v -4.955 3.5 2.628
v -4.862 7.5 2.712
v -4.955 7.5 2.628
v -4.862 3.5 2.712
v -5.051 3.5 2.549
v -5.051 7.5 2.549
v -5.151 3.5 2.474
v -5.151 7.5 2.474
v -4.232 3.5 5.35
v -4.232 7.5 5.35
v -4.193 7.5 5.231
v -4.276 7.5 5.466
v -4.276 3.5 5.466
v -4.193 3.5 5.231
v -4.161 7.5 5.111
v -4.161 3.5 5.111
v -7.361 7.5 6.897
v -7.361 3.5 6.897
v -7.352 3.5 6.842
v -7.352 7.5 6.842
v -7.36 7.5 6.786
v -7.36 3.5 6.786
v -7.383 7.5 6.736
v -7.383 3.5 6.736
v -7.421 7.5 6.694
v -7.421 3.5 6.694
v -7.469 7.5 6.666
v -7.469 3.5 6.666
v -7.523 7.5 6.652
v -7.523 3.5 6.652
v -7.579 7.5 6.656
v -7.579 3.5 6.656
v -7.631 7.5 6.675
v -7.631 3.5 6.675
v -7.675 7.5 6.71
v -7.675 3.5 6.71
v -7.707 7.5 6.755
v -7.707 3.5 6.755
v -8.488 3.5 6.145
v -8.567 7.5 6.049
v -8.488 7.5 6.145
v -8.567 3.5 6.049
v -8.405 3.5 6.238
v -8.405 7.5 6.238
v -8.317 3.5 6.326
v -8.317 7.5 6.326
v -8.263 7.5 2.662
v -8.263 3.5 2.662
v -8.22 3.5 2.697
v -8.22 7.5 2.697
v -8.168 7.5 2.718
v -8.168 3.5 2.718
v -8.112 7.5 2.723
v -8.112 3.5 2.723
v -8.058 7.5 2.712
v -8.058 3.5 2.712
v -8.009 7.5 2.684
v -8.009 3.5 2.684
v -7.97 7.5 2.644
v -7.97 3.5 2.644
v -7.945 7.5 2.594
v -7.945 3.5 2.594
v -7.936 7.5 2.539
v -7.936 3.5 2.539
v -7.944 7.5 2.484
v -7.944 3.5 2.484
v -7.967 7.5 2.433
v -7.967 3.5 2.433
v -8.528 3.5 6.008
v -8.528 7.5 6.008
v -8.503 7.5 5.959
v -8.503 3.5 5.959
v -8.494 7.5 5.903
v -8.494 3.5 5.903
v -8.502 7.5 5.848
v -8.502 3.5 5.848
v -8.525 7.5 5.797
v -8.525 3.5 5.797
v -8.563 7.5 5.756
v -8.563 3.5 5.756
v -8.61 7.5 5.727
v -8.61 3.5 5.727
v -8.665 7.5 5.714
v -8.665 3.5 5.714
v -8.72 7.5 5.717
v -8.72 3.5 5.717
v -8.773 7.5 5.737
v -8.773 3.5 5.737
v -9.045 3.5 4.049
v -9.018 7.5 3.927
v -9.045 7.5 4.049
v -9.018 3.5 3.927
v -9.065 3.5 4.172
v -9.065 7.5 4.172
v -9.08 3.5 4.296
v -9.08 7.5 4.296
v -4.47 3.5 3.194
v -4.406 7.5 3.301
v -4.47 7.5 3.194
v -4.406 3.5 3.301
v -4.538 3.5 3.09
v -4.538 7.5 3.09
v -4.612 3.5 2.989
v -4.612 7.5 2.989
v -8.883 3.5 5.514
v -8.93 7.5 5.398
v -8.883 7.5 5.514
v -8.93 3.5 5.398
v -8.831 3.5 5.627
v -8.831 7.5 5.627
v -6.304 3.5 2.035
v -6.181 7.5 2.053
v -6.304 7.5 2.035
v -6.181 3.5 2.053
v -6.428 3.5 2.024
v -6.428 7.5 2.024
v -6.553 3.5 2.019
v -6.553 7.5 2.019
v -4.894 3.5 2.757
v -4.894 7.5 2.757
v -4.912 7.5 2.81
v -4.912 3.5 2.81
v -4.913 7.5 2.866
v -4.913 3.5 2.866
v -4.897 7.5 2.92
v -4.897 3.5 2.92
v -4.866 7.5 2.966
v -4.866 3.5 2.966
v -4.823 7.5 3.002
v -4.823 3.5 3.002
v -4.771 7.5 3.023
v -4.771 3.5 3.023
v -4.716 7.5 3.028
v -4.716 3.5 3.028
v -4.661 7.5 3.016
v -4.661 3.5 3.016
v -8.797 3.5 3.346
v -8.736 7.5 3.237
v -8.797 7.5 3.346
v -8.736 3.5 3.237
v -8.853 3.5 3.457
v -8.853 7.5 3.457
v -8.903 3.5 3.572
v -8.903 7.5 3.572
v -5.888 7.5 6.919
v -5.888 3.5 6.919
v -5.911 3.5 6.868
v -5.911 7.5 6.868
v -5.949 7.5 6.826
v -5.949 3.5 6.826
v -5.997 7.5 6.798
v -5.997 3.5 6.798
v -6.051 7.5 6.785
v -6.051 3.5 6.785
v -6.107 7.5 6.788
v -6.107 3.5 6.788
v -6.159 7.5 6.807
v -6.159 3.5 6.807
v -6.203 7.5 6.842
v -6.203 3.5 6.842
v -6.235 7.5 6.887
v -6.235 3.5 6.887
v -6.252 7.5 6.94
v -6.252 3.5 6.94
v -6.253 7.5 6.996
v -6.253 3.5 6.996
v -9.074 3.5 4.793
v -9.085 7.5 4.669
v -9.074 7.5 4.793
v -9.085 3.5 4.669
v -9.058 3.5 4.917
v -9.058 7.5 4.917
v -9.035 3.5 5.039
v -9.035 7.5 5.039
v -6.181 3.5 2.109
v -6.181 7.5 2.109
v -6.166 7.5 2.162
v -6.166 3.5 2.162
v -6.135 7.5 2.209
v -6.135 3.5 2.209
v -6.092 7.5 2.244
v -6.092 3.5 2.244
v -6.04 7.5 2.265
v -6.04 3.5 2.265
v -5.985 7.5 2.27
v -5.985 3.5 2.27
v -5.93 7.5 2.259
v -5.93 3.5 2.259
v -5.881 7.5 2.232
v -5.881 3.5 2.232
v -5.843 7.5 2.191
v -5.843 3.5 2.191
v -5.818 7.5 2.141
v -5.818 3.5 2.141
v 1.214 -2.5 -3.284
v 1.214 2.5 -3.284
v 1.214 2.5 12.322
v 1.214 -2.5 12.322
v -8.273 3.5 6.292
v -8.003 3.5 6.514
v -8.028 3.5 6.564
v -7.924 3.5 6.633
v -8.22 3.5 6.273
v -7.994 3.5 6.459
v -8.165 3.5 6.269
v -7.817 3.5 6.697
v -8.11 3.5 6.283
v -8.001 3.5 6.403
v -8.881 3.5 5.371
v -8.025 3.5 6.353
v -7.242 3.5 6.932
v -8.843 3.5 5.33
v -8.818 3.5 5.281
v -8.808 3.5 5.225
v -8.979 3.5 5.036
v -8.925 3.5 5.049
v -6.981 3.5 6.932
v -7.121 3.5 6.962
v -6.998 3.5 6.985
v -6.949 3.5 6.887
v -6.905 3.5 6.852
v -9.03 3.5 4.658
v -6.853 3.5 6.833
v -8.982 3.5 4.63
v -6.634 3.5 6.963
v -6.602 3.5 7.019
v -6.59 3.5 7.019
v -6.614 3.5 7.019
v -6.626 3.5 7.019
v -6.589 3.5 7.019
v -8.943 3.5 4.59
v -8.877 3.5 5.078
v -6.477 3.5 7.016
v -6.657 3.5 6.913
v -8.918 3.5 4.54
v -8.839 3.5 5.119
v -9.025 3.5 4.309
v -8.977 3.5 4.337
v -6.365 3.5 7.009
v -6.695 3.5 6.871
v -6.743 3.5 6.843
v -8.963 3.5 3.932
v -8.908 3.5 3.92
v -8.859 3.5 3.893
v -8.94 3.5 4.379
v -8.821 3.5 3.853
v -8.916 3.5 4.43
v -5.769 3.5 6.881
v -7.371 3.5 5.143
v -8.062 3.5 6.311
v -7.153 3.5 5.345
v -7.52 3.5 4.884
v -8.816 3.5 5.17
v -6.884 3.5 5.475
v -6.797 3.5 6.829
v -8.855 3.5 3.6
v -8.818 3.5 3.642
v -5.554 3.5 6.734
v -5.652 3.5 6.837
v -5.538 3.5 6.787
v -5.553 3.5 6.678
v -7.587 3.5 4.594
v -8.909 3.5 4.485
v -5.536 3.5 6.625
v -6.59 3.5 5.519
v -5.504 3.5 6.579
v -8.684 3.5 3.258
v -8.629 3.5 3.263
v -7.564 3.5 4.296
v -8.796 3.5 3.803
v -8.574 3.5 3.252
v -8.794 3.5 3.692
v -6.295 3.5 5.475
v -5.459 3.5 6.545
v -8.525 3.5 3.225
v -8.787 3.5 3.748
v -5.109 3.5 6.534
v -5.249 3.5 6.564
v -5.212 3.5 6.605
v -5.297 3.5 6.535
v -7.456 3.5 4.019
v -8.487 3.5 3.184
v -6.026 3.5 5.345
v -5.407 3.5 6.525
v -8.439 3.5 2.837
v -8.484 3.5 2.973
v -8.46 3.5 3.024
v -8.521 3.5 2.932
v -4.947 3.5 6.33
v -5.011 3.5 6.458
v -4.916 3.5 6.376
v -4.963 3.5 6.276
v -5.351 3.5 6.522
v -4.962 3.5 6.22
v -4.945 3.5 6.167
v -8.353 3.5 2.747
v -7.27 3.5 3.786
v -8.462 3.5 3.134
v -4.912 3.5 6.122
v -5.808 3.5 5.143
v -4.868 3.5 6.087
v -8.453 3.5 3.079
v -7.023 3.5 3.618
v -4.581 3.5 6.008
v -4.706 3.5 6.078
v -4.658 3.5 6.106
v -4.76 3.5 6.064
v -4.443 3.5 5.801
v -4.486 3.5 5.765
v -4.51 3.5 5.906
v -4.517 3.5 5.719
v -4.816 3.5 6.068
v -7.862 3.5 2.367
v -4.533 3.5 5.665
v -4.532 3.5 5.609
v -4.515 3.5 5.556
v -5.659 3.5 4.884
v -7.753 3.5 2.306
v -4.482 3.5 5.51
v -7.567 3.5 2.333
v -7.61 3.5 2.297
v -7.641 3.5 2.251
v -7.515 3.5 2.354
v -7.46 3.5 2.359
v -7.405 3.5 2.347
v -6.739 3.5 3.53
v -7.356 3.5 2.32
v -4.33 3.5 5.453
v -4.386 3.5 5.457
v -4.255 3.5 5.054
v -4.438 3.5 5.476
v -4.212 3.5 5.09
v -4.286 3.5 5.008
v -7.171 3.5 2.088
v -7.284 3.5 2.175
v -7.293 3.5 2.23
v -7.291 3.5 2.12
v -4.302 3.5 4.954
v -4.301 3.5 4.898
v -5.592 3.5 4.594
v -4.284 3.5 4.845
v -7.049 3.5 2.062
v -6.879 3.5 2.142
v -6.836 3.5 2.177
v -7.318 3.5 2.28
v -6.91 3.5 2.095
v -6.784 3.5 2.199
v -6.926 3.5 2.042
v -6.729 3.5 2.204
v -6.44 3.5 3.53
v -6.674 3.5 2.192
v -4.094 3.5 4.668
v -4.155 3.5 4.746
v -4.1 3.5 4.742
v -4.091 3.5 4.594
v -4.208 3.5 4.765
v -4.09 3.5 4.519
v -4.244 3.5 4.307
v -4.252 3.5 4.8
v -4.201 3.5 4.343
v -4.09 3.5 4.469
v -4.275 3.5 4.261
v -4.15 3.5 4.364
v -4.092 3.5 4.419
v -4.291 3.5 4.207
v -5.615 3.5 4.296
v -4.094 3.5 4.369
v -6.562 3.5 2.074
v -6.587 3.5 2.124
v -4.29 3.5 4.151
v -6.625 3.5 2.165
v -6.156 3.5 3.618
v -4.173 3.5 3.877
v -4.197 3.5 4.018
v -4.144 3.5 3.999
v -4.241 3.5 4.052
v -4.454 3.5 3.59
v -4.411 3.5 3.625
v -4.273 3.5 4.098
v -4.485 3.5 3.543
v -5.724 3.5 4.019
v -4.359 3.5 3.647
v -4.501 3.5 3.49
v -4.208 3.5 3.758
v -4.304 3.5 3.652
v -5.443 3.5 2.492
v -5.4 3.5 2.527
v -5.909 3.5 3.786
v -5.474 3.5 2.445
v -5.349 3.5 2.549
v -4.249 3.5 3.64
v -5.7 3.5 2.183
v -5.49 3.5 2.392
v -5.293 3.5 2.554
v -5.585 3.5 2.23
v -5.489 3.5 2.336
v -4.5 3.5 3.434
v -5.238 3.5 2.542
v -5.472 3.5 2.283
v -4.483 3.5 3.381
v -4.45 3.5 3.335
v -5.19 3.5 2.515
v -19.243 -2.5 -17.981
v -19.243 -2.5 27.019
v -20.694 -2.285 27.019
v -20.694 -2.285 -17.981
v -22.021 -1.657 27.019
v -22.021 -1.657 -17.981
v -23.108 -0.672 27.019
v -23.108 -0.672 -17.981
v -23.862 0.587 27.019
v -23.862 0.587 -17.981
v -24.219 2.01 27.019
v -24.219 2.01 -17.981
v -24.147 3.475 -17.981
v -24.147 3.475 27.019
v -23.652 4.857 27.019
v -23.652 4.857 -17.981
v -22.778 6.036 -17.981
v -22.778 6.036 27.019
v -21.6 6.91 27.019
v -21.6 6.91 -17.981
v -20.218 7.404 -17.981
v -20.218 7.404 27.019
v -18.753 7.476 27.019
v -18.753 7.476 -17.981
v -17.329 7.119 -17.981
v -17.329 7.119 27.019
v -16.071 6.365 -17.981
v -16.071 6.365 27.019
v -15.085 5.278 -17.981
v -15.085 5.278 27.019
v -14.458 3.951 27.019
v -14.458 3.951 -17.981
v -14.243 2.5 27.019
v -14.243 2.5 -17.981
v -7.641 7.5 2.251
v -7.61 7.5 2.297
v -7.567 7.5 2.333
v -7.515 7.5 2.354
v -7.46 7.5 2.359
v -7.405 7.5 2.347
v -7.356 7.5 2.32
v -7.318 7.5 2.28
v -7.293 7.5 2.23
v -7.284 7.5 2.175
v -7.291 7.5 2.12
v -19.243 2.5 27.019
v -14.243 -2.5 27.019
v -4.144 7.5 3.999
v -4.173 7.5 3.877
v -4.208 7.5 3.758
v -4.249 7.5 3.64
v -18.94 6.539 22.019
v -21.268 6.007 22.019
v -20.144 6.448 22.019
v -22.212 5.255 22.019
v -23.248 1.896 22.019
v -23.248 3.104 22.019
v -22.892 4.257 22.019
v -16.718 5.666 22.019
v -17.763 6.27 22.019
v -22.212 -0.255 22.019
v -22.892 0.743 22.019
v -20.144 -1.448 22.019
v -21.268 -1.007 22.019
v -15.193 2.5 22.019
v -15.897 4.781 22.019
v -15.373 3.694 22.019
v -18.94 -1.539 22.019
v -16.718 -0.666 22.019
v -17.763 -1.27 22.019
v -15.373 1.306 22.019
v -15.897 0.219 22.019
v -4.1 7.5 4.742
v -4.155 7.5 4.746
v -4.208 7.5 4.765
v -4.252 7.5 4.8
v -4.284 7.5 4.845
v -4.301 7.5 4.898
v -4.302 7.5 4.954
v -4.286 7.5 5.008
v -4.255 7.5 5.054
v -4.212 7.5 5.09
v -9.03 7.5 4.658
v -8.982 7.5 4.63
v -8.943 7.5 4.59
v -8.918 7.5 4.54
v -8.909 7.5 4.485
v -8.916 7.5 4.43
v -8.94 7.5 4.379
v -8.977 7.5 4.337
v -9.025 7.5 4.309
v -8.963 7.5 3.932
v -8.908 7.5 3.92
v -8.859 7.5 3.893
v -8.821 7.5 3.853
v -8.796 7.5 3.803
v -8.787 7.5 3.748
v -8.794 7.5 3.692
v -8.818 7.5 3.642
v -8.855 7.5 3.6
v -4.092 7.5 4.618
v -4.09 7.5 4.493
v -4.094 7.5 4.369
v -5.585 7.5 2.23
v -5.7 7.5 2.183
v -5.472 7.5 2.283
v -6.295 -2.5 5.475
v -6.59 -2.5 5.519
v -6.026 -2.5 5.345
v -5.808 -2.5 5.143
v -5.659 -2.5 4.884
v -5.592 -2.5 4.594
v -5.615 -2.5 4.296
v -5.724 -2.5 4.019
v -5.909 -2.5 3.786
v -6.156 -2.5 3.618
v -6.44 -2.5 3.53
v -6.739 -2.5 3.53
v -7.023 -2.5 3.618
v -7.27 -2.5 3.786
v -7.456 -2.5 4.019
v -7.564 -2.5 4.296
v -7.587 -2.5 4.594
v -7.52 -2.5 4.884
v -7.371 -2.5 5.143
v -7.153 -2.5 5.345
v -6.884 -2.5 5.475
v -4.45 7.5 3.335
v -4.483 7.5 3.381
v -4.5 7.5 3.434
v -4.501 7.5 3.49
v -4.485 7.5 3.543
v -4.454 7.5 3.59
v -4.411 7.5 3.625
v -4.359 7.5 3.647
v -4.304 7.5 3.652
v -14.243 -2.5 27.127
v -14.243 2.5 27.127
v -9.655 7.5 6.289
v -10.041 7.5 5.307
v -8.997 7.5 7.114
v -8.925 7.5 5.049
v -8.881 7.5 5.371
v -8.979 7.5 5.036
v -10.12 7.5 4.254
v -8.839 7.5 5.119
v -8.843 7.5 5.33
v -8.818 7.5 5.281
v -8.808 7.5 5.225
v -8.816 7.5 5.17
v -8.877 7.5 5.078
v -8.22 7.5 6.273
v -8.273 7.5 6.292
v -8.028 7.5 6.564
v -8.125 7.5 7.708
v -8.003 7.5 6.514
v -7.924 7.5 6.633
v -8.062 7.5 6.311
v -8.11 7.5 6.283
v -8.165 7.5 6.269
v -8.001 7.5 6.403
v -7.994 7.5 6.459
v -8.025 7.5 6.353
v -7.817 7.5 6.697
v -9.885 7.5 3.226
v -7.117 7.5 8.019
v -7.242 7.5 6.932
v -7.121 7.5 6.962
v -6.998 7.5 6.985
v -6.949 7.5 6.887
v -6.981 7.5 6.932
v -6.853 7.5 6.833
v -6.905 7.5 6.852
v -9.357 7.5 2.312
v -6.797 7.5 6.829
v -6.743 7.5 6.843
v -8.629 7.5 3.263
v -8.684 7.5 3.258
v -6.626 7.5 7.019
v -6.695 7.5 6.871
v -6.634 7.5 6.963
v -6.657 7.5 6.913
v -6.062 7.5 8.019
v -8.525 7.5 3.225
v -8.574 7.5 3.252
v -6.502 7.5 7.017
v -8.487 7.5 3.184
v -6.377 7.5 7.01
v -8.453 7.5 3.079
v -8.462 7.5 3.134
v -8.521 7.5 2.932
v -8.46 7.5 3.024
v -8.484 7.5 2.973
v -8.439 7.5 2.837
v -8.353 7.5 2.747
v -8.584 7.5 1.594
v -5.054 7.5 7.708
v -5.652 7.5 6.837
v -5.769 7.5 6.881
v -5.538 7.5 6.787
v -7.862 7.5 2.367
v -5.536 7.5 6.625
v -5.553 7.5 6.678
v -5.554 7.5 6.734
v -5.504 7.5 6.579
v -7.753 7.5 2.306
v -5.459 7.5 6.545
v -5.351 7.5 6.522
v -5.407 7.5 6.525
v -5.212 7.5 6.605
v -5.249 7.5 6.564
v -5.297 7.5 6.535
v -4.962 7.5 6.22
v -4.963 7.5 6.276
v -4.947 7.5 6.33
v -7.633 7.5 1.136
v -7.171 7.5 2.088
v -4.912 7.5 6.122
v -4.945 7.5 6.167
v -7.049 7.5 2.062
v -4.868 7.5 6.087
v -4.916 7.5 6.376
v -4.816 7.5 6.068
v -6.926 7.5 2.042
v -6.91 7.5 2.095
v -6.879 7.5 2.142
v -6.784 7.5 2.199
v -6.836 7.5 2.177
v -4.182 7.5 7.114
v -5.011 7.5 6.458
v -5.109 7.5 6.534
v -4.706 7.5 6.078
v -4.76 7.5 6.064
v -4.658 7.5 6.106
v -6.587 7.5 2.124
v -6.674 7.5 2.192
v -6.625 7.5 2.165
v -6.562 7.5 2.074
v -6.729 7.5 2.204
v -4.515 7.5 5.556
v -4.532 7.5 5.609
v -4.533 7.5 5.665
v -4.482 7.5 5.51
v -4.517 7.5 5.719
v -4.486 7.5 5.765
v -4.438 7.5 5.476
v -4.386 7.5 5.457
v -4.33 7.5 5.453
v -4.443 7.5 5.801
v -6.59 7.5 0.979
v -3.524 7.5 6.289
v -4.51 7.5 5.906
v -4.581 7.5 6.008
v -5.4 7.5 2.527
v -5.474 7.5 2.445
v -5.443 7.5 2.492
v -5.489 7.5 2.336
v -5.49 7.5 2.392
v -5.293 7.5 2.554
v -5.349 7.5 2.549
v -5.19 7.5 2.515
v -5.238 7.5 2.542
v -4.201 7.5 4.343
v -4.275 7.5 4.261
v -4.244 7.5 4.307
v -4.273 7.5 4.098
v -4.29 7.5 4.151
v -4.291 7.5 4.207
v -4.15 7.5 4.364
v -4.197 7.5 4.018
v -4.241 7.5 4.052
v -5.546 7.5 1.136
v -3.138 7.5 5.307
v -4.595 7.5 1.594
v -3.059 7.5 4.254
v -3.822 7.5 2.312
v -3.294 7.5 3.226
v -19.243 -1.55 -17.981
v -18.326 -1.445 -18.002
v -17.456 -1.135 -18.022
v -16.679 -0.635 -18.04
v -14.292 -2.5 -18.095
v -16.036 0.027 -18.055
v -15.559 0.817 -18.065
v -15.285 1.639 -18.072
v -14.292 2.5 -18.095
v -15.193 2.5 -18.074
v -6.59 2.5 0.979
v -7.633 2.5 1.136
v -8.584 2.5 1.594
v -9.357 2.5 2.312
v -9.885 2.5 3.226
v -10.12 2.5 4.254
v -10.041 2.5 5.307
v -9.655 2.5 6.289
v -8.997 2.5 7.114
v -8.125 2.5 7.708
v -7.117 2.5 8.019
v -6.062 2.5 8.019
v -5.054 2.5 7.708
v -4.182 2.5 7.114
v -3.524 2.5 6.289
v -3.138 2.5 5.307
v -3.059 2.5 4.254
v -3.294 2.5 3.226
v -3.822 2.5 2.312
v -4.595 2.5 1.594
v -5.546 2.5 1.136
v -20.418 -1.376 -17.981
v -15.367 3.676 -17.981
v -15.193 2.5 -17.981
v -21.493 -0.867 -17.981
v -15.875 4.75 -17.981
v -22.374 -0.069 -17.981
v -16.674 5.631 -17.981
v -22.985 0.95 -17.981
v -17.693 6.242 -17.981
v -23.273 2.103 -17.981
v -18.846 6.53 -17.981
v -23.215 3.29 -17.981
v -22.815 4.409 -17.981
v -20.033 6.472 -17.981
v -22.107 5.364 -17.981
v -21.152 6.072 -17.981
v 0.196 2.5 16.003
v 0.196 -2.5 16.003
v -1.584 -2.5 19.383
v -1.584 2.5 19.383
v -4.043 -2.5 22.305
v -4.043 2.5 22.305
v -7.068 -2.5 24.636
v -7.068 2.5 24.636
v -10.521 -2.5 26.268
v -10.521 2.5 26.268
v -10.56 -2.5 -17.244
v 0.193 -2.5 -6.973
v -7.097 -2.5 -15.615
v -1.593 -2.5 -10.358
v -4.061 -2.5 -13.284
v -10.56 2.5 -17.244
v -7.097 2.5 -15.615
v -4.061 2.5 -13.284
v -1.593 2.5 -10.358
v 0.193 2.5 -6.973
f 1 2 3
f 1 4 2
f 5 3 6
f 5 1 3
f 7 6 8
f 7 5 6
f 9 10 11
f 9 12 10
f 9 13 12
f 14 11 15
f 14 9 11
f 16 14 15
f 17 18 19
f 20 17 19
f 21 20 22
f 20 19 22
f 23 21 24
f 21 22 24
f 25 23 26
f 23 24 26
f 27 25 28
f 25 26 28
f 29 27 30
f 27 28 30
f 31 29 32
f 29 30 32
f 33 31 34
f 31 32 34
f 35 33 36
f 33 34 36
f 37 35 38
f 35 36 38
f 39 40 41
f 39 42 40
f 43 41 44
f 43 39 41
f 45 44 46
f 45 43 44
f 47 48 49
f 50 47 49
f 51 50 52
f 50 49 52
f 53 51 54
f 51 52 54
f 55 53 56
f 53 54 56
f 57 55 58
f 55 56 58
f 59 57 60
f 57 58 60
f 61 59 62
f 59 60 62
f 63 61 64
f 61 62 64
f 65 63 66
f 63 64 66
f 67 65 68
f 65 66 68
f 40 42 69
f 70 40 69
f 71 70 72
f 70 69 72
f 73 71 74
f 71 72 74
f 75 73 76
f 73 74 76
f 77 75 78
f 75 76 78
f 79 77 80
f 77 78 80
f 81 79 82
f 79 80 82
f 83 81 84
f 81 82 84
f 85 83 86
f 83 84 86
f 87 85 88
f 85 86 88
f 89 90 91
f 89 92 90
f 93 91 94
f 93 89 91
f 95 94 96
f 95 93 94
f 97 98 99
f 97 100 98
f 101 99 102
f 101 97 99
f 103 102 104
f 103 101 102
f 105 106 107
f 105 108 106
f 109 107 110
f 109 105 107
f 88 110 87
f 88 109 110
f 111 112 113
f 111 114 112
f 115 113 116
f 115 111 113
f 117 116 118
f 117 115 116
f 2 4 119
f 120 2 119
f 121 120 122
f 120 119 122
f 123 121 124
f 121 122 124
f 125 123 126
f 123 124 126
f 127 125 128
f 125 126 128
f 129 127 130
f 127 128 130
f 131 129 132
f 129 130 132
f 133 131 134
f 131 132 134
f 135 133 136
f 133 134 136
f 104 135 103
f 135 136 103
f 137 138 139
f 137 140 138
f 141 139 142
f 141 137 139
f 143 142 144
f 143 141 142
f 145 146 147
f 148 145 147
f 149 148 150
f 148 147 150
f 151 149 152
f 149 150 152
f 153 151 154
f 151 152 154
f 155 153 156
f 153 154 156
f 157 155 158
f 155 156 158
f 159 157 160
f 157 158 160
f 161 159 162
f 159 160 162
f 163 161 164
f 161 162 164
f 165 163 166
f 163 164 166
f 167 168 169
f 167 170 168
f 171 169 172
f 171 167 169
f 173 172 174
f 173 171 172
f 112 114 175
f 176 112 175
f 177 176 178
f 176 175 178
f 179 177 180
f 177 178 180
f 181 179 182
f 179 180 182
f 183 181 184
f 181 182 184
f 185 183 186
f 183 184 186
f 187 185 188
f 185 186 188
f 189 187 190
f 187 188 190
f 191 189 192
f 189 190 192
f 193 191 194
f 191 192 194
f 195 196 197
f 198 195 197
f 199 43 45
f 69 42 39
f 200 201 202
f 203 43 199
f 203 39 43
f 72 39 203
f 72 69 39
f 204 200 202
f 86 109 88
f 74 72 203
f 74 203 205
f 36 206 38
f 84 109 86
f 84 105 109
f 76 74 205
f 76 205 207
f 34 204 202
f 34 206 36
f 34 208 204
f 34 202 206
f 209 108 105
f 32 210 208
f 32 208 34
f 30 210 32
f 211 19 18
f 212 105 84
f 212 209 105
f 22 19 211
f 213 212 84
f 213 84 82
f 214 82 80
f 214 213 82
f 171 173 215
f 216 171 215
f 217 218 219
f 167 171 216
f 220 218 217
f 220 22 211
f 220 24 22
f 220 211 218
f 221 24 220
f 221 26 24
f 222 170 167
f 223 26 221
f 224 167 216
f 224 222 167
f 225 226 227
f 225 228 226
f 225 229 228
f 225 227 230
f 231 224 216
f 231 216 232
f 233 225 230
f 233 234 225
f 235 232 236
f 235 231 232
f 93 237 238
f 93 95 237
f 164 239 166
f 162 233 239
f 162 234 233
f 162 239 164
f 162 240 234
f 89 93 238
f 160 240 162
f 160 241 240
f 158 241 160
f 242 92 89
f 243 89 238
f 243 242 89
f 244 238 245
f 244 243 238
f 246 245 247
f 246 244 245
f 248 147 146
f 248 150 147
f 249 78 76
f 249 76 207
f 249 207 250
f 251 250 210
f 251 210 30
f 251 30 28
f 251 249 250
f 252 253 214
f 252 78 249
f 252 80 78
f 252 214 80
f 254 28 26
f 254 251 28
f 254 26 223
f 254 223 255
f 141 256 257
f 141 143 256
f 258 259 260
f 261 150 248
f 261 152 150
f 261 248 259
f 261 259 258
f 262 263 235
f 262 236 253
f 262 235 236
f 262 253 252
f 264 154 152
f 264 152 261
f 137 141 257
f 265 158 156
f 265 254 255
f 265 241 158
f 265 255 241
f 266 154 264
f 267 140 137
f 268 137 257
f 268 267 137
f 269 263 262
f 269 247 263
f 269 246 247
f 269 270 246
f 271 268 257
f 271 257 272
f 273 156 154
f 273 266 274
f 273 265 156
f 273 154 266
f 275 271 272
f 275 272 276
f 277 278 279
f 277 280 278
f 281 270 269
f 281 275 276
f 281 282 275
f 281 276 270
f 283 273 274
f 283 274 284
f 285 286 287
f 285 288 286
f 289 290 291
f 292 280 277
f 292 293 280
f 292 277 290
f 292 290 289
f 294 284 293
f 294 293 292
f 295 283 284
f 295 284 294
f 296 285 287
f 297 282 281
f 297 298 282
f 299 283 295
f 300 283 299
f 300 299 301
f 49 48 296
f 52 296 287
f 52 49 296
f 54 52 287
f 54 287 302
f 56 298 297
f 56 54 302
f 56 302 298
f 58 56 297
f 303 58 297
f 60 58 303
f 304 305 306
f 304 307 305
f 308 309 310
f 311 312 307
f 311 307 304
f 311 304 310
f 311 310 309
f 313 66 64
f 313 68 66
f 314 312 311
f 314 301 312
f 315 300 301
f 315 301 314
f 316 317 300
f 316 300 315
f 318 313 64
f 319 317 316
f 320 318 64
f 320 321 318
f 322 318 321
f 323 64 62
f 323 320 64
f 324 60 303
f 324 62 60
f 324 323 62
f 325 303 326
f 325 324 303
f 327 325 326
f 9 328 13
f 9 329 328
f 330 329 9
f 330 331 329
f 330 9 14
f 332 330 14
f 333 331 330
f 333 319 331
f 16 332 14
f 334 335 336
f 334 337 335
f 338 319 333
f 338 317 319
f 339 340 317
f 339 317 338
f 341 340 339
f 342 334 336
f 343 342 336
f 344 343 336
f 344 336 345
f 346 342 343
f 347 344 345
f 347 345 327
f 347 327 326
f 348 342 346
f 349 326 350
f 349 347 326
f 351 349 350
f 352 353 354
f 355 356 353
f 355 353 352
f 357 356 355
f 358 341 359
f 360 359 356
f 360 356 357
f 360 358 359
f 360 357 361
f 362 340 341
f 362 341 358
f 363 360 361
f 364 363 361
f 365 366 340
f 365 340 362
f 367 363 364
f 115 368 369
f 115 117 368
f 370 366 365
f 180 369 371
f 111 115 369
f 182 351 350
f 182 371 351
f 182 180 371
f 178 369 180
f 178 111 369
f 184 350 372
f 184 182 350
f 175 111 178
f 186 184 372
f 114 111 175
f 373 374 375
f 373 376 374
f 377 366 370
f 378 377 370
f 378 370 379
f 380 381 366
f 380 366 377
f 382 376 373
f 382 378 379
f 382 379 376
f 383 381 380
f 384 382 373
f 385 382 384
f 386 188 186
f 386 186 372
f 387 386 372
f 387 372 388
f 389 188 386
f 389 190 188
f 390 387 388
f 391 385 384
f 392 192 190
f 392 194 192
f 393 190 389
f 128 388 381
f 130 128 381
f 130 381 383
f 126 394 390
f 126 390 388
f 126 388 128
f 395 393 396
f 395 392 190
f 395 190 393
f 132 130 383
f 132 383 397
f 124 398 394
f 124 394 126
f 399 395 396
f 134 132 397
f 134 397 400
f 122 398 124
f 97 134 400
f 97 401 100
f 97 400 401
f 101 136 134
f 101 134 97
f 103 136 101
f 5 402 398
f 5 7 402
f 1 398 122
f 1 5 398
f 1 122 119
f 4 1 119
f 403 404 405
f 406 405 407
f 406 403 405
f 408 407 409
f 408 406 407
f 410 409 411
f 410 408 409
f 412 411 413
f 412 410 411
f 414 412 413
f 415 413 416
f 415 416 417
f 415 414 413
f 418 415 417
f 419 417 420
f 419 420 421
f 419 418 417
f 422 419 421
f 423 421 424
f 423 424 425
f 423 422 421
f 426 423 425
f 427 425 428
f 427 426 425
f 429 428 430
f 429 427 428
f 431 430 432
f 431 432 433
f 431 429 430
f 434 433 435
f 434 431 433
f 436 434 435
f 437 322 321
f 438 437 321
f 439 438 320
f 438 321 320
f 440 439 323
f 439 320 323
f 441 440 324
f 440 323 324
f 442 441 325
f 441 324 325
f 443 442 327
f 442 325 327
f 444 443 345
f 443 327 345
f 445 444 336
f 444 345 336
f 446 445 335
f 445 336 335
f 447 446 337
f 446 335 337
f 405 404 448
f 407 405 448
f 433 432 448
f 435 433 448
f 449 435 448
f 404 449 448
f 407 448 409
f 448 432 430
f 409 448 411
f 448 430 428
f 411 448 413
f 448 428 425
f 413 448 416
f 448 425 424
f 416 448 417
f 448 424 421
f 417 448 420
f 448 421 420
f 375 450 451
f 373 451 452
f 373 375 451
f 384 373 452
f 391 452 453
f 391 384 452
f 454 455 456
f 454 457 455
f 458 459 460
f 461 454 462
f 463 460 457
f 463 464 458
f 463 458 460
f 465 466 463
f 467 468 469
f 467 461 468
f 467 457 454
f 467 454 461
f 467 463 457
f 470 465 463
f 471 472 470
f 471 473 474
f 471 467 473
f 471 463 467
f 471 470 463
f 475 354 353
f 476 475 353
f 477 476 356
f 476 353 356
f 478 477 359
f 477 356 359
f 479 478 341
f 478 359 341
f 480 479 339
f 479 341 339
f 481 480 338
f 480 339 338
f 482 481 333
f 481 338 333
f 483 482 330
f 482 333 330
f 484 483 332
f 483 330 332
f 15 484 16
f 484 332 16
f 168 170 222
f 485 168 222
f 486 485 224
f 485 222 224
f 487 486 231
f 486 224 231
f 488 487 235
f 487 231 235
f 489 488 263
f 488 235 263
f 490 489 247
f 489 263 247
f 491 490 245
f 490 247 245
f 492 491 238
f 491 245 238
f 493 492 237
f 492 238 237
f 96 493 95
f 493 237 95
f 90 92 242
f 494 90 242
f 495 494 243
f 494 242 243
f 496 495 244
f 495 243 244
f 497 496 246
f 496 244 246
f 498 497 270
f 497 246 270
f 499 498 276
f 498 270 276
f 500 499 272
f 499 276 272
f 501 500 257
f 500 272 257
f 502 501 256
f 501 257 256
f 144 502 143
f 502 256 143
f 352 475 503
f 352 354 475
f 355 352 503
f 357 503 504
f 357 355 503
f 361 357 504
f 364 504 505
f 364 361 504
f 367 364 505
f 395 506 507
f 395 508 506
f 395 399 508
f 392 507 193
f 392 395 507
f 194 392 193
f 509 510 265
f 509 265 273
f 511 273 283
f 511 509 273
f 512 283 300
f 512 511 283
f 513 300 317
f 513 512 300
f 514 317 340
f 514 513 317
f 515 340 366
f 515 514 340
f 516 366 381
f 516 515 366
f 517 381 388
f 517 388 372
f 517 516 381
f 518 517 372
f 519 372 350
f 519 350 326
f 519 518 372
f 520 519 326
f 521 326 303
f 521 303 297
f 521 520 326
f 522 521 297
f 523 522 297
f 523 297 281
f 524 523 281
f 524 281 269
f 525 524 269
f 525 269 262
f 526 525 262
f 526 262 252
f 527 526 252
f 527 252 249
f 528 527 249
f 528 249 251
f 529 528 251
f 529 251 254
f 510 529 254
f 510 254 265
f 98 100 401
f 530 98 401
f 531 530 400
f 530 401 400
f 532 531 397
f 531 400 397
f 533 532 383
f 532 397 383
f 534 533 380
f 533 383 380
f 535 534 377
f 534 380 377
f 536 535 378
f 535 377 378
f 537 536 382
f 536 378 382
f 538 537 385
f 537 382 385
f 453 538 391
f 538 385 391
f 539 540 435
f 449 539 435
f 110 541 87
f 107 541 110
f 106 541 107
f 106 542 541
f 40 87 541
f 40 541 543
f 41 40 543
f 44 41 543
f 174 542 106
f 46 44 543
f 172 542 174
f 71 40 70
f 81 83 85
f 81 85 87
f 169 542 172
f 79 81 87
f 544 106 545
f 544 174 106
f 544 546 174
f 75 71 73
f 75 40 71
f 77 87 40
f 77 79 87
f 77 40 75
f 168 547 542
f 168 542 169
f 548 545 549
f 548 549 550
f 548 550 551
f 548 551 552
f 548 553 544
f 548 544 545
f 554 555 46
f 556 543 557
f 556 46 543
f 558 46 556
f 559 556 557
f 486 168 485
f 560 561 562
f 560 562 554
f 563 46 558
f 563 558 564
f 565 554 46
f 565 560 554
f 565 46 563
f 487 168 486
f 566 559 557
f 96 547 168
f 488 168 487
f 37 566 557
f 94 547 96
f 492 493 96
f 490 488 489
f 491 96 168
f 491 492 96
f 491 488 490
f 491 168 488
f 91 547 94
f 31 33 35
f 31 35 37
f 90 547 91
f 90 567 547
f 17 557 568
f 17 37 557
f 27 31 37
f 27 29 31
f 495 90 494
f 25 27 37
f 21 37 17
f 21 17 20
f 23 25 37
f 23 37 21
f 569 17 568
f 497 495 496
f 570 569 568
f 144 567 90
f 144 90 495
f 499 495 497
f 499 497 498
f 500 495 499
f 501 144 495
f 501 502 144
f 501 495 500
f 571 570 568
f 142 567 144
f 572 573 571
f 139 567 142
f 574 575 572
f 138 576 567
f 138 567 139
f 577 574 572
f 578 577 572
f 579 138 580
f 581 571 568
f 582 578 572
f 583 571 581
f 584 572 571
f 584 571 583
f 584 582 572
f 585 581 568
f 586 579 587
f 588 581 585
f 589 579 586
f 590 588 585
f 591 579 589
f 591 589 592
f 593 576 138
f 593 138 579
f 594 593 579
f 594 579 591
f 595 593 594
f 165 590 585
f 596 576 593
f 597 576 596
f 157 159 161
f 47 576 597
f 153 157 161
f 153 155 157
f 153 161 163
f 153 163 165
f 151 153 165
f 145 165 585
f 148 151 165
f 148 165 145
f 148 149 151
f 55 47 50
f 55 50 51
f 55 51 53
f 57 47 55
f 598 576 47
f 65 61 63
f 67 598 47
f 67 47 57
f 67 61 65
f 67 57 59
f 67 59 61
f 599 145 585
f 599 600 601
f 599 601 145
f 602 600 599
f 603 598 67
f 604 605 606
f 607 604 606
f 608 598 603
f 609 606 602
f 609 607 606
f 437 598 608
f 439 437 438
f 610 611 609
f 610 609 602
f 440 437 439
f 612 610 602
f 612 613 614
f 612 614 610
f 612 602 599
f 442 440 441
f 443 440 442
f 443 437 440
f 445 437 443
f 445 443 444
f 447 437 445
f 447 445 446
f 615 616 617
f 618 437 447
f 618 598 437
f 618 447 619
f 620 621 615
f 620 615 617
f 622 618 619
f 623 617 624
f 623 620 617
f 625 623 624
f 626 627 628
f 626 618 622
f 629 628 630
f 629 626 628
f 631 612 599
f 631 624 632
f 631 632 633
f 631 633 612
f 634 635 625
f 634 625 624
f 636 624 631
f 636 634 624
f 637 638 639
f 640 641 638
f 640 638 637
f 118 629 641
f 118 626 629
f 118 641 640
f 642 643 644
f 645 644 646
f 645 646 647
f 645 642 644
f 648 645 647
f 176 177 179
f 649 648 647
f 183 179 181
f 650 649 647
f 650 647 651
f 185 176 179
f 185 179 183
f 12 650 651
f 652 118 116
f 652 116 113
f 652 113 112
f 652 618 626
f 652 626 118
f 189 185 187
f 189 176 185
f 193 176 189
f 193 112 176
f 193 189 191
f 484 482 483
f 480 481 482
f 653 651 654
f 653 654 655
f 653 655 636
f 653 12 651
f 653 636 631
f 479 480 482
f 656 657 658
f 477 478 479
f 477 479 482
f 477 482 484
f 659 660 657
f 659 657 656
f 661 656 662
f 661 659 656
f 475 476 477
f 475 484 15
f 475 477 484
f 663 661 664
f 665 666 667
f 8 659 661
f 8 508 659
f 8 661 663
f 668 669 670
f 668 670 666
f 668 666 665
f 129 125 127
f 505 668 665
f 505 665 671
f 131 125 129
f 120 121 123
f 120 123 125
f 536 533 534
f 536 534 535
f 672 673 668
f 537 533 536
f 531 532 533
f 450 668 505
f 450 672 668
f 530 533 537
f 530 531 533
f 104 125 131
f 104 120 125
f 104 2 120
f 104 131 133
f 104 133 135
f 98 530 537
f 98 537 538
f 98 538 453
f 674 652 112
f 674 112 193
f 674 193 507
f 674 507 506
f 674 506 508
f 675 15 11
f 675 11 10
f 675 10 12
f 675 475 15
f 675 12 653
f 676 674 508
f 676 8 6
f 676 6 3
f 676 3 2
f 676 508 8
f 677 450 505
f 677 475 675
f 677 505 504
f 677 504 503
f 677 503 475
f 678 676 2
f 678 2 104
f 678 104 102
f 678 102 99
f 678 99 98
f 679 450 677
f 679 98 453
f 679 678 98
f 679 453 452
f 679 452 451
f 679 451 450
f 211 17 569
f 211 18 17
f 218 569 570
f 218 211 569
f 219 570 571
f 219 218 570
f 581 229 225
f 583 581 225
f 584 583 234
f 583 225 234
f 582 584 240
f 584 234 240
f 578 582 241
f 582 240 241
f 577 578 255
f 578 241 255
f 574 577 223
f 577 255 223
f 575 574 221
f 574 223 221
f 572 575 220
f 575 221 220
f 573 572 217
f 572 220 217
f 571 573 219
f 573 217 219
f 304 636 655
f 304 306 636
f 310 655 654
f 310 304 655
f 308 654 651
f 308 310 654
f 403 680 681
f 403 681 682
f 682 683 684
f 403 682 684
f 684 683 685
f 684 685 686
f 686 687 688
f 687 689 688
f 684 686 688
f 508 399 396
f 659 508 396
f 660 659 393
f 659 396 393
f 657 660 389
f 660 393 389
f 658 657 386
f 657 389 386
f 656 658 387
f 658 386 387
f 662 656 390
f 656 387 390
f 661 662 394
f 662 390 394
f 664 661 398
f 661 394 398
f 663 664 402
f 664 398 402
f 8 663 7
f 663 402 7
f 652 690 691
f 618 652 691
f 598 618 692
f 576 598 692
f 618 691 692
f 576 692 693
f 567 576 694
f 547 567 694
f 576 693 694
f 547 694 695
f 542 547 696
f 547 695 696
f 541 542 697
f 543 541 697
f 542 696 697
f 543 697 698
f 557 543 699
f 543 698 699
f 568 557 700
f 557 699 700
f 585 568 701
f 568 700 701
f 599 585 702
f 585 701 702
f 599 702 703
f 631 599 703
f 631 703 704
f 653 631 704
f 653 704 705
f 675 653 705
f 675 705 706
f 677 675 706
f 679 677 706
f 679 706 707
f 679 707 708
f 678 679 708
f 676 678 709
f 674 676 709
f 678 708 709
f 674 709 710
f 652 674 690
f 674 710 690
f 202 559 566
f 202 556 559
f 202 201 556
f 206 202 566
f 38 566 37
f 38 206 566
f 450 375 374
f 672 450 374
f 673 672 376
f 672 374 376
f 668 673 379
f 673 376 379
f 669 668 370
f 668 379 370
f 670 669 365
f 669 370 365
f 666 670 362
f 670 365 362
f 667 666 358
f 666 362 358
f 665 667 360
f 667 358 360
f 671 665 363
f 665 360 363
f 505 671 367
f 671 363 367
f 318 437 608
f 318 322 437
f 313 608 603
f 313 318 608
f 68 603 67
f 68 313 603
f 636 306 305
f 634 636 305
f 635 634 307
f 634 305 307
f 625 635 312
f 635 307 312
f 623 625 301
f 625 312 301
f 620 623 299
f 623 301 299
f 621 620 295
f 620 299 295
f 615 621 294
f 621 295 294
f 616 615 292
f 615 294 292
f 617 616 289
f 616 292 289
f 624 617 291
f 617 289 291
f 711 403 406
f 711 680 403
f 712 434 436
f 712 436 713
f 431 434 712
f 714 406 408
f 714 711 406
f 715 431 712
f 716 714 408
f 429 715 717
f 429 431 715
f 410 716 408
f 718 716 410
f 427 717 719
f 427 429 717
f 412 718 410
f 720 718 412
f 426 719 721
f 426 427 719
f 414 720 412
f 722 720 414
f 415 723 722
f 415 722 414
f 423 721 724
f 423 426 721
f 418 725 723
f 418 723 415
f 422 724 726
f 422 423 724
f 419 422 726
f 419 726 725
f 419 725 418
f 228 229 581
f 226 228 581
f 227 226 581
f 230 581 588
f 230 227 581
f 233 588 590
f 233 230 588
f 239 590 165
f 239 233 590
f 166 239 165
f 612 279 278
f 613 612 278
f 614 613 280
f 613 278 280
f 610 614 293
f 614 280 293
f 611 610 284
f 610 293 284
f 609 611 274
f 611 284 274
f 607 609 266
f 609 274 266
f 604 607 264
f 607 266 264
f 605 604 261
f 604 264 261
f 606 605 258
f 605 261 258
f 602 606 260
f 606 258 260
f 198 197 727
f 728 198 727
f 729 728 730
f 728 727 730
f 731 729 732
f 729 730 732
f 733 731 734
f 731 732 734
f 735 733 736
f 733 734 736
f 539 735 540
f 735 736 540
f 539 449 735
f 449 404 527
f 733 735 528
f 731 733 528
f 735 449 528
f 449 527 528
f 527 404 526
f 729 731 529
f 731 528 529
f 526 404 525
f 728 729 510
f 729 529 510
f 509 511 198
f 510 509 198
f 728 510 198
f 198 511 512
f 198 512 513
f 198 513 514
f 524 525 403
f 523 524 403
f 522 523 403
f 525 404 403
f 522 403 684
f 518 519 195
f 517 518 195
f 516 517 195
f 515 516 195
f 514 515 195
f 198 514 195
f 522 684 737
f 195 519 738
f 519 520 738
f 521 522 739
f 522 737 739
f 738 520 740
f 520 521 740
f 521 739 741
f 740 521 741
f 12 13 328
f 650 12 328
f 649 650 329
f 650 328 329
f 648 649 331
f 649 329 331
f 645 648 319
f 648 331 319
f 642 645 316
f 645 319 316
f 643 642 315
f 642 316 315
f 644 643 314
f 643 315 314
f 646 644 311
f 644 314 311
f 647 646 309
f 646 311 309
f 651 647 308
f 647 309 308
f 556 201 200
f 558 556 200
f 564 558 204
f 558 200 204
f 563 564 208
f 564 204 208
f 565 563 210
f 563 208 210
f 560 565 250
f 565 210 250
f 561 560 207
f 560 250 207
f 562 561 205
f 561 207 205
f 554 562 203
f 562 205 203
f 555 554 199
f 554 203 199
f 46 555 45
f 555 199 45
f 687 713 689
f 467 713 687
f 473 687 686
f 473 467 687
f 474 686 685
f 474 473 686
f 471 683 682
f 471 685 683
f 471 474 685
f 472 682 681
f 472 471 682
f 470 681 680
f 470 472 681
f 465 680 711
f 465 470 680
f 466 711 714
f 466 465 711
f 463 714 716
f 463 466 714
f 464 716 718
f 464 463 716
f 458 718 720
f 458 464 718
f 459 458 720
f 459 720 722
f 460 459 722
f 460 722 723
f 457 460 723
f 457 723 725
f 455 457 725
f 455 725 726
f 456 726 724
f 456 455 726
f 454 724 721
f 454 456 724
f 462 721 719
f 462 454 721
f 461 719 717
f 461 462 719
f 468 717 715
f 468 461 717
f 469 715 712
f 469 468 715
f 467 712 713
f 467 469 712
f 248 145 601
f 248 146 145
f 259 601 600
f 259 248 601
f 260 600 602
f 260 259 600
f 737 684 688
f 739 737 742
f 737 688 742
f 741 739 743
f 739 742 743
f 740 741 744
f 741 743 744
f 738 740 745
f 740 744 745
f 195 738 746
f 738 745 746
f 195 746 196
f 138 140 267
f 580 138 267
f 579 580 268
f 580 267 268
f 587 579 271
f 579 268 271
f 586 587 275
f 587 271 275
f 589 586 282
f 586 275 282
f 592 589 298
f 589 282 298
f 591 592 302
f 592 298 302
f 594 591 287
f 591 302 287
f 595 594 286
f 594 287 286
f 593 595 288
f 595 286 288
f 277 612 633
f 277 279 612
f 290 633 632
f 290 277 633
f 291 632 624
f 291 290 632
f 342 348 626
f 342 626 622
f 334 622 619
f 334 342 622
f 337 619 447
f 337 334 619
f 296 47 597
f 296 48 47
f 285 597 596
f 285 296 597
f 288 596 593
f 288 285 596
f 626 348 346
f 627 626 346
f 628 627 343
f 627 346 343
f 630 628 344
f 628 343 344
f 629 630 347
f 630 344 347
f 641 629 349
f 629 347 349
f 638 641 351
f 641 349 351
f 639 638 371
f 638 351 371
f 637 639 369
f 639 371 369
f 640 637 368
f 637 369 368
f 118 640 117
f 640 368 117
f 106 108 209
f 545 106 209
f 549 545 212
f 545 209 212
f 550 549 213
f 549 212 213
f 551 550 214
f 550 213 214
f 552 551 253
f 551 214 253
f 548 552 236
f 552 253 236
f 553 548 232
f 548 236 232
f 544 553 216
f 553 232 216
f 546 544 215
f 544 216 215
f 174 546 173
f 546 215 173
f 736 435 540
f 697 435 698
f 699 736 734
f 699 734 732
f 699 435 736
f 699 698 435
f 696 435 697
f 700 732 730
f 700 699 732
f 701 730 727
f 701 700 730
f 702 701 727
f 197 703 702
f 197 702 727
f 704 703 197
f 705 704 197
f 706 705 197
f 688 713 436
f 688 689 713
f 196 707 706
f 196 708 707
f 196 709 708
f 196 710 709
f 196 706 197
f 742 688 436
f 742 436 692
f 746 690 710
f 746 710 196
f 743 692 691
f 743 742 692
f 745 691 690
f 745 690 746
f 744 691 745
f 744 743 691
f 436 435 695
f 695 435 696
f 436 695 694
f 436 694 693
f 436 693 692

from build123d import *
from build123d.topology import SkipClean

# Parameters (mm, degrees)
BOSS_EXTRUDE7_DEPTH      = 2.5
BOSS_EXTRUDE7_DEPTH_BACK = 2.5
SKETCH1_R                = 1
SKETCH3_W                = 5
SKETCH3_H                = 5
SKETCH3_R                = 1
BOSS_EXTRUDE9_DEPTH      = 1
FILLET2_R                = 2.5
SKETCH4_R                = 3.54
SKETCH4_R_2              = 2.5
BOSS_EXTRUDE11_DEPTH     = 5
BOSS_EXTRUDE13_START     = -4
BOSS_EXTRUDE13_DEPTH     = 4
CIRPATTERN2_COUNT        = 21
SKETCH18_R               = 5
SKETCH18_R_2             = 4.05
BOSS_EXTRUDE24_DEPTH     = 45
SKETCH19_R               = 4.05
CUT_EXTRUDE2_DEPTH       = 55.105925545
BOSS_EXTRUDE25_START     = -5
SKETCH20_R               = 5
BOSS_EXTRUDE25_DEPTH     = 5
CUT_EXTRUDE4_DEPTH       = 45
BOSS_EXTRUDE35_DEPTH     = 5
SKETCH28_W               = 5
SKETCH28_H               = 1.900081374
CUT_EXTRUDE9_DEPTH       = 45
CUT_EXTRUDE10_DEPTH      = 45
CUT_EXTRUDE12_DEPTH      = 40
CUT_EXTRUDE12_DEPTH_BACK = 40
SKETCH32_R               = 4.05
CUT_EXTRUDE13_START      = -40
SKETCH33_R               = 1
CUT_EXTRUDE13_DEPTH      = 40


with BuildPart() as part:
    # Sketch1 → Boss-Extrude7 (new, two sides: drawn at the far end of the back side and taken through both)
    with BuildSketch(Plane(origin=(0, 0, 0), x_dir=(1, 0, 0), z_dir=(0, 1, 0)).offset(-BOSS_EXTRUDE7_DEPTH_BACK)):
        Polygon((-29.089537279, -2.019014343), (-29.089537279, -7.019014343), (-14.392838138, -12.322315202), (-9.089537279, -27.019014343), (-4.089537279, -27.019014343), (1.21376358, -12.322315202), (15.910462721, -7.019014343), (15.910462721, -2.019014343), (1.21376358, 3.284286516), (-4.089537279, 17.980985657), (-9.089537279, 17.980985657), (-14.392838138, 3.284286516), align=None)
        with Locations(Location((-6.589537279, -4.519014343, 0), (0, 0, 270))):
            Circle(SKETCH1_R, mode=Mode.SUBTRACT)
    extrude(amount=BOSS_EXTRUDE7_DEPTH + BOSS_EXTRUDE7_DEPTH_BACK)

    # Sketch3 → Boss-Extrude9 (add)
    with BuildSketch(Plane(origin=(0, 2.5, 0), x_dir=(1, 0, 0), z_dir=(0, 1, 0))):
        with Locations((-6.589537279, -4.519014343)):
            Rectangle(SKETCH3_W, SKETCH3_H)
        with Locations(Location((-6.589537279, -4.519014343, 0), (0, 0, 270))):
            Circle(SKETCH3_R, mode=Mode.SUBTRACT)
    extrude(amount=BOSS_EXTRUDE9_DEPTH)

    # Fillet2
    fillet2_edges = [part.edges().sort_by_distance(p)[0] for p in [
        (-4.089537279, 3, 7.019014343),
        (-4.089537279, 3, 2.019014343),
        (-9.089537279, 3, 7.019014343),
        (-9.089537279, 3, 2.019014343),
    ]]
    fillet(fillet2_edges, radius=FILLET2_R - 0.0001)  # a hair under: the kernel refuses the full size

    # Sketch4 → Boss-Extrude11 (add)
    with BuildSketch(Plane(origin=(0, 2.5, 0), x_dir=(1, 0, 0), z_dir=(0, 1, 0))):
        with Locations(Location((-6.589537279, -4.519014343, 0), (0, 0, 90))):
            Circle(SKETCH4_R)
        with Locations(Location((-6.589537279, -4.519014343, 0), (0, 0, 90))):
            Circle(SKETCH4_R_2, mode=Mode.SUBTRACT)
    extrude(amount=BOSS_EXTRUDE11_DEPTH)

    # Sketch8 → Boss-Extrude13 (add)
    with BuildSketch(Plane(origin=(0, 7.5, 0), x_dir=(1, 0, 0), z_dir=(0, 1, 0)).offset(BOSS_EXTRUDE13_START)):
        with BuildLine():
            ThreePointArc((-7.641010895, -2.250886649), (-7.405163574, -2.347475501), (-7.291219912, -2.119505751))
            ThreePointArc((-7.291219912, -2.119505751), (-7.468573367, -2.178652072), (-7.641010895, -2.250886649))
        make_face()
    boss_extrude13 = extrude(amount=BOSS_EXTRUDE13_DEPTH)

    # CirPattern2: Boss-Extrude13 ×21 about axis
    cirpattern2_axis = Axis((-6.589537279, 0, 4.519014343), (0, 1, 0))
    for i in range(1, CIRPATTERN2_COUNT):
        add(boss_extrude13.rotate(cirpattern2_axis, i * 360 / CIRPATTERN2_COUNT))

    # Sketch18 → Boss-Extrude24 (add)
    with BuildSketch(Plane(origin=(0, 0, -17.980985657), x_dir=(-1, 0, 0), z_dir=(0, 0, -1))):
        with Locations((19.242838138, 2.5)):
            Circle(SKETCH18_R)
        with Locations((19.242838138, 2.5)):
            Circle(SKETCH18_R_2, mode=Mode.SUBTRACT)
    extrude(amount=-BOSS_EXTRUDE24_DEPTH)

    # Sketch19 → Cut-Extrude2 (cut, through all)
    with BuildSketch(Plane(origin=(0, 0, -17.980985657), x_dir=(-1, 0, 0), z_dir=(0, 0, -1))):
        with Locations((19.242838138, 2.5)):
            Circle(SKETCH19_R)
    extrude(amount=-CUT_EXTRUDE2_DEPTH, mode=Mode.SUBTRACT)

    # Sketch20 → Boss-Extrude25 (add)
    with BuildSketch(Plane.XY.offset(27.019014343).offset(BOSS_EXTRUDE25_START)):
        with Locations(Location((-19.242838138, 2.5, 0), (0, 0, 180))):
            Circle(SKETCH20_R)
    extrude(amount=BOSS_EXTRUDE25_DEPTH)

    # Sketch24 → Cut-Extrude4 (cut)
    with SkipClean():  # the faces are left unmerged after this step: merging them gives an invalid solid
        with BuildSketch(Plane(origin=(0, 0, -17.980985657), x_dir=(-1, 0, 0), z_dir=(0, 0, -1))):
            with BuildLine():
                Line((19.242838138, -2.5), (29.239649505, -2.5))
                Line((29.239649505, -2.5), (29.239649505, 2.5))
                Line((29.239649505, 2.5), (24.242838138, 2.5))
                ThreePointArc((24.242838138, 2.5), (22.778372044, -1.035533906), (19.242838138, -2.5))
            make_face()
        extrude(amount=-CUT_EXTRUDE4_DEPTH, mode=Mode.SUBTRACT)

    # Sketch26 → Boss-Extrude35 (add)
    with BuildSketch(Plane(origin=(0, 2.5, 0), x_dir=(1, 0, 0), z_dir=(0, 1, 0))):
        with BuildLine():
            Line((1.21376358, 3.284286516), (1.21376358, -12.322315202))
            ThreePointArc((1.21376358, -12.322315202), (-5.970751226, -23.907365708), (-19.242838138, -27.019014343))
            Line((-19.242838138, -27.019014343), (-19.242838138, 17.980985657))
            ThreePointArc((-19.242838138, 17.980985657), (-5.970751226, 14.869337023), (1.21376358, 3.284286516))
        make_face()
    extrude(amount=-BOSS_EXTRUDE35_DEPTH)

    # Sketch28 → Cut-Extrude9 (cut)
    with BuildSketch(Plane(origin=(0, 2.5, 0), x_dir=(1, 0, 0), z_dir=(0, 1, 0))):
        Polygon((-19.242838138, 17.980985657), (-14.291903713, 18.094552541), (-14.291903713, 20.179520428), (-19.242838138, 20.179520428), align=None)
        with Locations((-16.742838138, -27.96905503)):
            Rectangle(SKETCH28_W, SKETCH28_H)
    extrude(amount=-CUT_EXTRUDE9_DEPTH, mode=Mode.SUBTRACT)

    # Sketch30 → Cut-Extrude10 (cut)
    with BuildSketch(Plane(origin=(0, 2.5, 0), x_dir=(1, 0, 0), z_dir=(0, 1, 0))):
        with BuildLine():
            Line((1.21376358, 3.284286516), (1.21376358, -12.322315202))
            ThreePointArc((1.21376358, -12.322315202), (-5.970751226, -23.907365708), (-19.242838138, -27.019014343))
            Line((-19.242838138, -27.019014343), (-19.242838138, -29.875538086))
            Line((-19.242838138, -29.875538086), (19.285813169, -29.875538086))
            Line((19.285813169, -29.875538086), (19.285813169, 19.780165104))
            Line((19.285813169, 19.780165104), (-19.242838138, 19.780165104))
            Line((-19.242838138, 19.780165104), (-19.242838138, 17.980985657))
            ThreePointArc((-19.242838138, 17.980985657), (-5.970751226, 14.869337023), (1.21376358, 3.284286516))
        make_face()
    extrude(amount=-CUT_EXTRUDE10_DEPTH, mode=Mode.SUBTRACT)

    # Sketch32 → Cut-Extrude12 (cut, two sides: drawn at the far end of the back side and taken through both)
    with BuildSketch(Plane(origin=(0, 0, -17.980985657), x_dir=(-1, 0, 0), z_dir=(0, 0, -1)).offset(-CUT_EXTRUDE12_DEPTH_BACK)):
        with Locations(Location((19.242838138, 2.5, 0), (0, 0, 180))):
            Circle(SKETCH32_R)
    extrude(amount=CUT_EXTRUDE12_DEPTH + CUT_EXTRUDE12_DEPTH_BACK, mode=Mode.SUBTRACT)

    # Sketch33 → Cut-Extrude13 (cut)
    with BuildSketch(Plane(origin=(0, 2.5, 0), x_dir=(1, 0, 0), z_dir=(0, 1, 0)).offset(CUT_EXTRUDE13_START)):
        with Locations(Location((-6.589537279, -4.519014343, 0), (0, 0, 270))):
            Circle(SKETCH33_R)
    extrude(amount=CUT_EXTRUDE13_DEPTH, mode=Mode.SUBTRACT)


solid = part.part
